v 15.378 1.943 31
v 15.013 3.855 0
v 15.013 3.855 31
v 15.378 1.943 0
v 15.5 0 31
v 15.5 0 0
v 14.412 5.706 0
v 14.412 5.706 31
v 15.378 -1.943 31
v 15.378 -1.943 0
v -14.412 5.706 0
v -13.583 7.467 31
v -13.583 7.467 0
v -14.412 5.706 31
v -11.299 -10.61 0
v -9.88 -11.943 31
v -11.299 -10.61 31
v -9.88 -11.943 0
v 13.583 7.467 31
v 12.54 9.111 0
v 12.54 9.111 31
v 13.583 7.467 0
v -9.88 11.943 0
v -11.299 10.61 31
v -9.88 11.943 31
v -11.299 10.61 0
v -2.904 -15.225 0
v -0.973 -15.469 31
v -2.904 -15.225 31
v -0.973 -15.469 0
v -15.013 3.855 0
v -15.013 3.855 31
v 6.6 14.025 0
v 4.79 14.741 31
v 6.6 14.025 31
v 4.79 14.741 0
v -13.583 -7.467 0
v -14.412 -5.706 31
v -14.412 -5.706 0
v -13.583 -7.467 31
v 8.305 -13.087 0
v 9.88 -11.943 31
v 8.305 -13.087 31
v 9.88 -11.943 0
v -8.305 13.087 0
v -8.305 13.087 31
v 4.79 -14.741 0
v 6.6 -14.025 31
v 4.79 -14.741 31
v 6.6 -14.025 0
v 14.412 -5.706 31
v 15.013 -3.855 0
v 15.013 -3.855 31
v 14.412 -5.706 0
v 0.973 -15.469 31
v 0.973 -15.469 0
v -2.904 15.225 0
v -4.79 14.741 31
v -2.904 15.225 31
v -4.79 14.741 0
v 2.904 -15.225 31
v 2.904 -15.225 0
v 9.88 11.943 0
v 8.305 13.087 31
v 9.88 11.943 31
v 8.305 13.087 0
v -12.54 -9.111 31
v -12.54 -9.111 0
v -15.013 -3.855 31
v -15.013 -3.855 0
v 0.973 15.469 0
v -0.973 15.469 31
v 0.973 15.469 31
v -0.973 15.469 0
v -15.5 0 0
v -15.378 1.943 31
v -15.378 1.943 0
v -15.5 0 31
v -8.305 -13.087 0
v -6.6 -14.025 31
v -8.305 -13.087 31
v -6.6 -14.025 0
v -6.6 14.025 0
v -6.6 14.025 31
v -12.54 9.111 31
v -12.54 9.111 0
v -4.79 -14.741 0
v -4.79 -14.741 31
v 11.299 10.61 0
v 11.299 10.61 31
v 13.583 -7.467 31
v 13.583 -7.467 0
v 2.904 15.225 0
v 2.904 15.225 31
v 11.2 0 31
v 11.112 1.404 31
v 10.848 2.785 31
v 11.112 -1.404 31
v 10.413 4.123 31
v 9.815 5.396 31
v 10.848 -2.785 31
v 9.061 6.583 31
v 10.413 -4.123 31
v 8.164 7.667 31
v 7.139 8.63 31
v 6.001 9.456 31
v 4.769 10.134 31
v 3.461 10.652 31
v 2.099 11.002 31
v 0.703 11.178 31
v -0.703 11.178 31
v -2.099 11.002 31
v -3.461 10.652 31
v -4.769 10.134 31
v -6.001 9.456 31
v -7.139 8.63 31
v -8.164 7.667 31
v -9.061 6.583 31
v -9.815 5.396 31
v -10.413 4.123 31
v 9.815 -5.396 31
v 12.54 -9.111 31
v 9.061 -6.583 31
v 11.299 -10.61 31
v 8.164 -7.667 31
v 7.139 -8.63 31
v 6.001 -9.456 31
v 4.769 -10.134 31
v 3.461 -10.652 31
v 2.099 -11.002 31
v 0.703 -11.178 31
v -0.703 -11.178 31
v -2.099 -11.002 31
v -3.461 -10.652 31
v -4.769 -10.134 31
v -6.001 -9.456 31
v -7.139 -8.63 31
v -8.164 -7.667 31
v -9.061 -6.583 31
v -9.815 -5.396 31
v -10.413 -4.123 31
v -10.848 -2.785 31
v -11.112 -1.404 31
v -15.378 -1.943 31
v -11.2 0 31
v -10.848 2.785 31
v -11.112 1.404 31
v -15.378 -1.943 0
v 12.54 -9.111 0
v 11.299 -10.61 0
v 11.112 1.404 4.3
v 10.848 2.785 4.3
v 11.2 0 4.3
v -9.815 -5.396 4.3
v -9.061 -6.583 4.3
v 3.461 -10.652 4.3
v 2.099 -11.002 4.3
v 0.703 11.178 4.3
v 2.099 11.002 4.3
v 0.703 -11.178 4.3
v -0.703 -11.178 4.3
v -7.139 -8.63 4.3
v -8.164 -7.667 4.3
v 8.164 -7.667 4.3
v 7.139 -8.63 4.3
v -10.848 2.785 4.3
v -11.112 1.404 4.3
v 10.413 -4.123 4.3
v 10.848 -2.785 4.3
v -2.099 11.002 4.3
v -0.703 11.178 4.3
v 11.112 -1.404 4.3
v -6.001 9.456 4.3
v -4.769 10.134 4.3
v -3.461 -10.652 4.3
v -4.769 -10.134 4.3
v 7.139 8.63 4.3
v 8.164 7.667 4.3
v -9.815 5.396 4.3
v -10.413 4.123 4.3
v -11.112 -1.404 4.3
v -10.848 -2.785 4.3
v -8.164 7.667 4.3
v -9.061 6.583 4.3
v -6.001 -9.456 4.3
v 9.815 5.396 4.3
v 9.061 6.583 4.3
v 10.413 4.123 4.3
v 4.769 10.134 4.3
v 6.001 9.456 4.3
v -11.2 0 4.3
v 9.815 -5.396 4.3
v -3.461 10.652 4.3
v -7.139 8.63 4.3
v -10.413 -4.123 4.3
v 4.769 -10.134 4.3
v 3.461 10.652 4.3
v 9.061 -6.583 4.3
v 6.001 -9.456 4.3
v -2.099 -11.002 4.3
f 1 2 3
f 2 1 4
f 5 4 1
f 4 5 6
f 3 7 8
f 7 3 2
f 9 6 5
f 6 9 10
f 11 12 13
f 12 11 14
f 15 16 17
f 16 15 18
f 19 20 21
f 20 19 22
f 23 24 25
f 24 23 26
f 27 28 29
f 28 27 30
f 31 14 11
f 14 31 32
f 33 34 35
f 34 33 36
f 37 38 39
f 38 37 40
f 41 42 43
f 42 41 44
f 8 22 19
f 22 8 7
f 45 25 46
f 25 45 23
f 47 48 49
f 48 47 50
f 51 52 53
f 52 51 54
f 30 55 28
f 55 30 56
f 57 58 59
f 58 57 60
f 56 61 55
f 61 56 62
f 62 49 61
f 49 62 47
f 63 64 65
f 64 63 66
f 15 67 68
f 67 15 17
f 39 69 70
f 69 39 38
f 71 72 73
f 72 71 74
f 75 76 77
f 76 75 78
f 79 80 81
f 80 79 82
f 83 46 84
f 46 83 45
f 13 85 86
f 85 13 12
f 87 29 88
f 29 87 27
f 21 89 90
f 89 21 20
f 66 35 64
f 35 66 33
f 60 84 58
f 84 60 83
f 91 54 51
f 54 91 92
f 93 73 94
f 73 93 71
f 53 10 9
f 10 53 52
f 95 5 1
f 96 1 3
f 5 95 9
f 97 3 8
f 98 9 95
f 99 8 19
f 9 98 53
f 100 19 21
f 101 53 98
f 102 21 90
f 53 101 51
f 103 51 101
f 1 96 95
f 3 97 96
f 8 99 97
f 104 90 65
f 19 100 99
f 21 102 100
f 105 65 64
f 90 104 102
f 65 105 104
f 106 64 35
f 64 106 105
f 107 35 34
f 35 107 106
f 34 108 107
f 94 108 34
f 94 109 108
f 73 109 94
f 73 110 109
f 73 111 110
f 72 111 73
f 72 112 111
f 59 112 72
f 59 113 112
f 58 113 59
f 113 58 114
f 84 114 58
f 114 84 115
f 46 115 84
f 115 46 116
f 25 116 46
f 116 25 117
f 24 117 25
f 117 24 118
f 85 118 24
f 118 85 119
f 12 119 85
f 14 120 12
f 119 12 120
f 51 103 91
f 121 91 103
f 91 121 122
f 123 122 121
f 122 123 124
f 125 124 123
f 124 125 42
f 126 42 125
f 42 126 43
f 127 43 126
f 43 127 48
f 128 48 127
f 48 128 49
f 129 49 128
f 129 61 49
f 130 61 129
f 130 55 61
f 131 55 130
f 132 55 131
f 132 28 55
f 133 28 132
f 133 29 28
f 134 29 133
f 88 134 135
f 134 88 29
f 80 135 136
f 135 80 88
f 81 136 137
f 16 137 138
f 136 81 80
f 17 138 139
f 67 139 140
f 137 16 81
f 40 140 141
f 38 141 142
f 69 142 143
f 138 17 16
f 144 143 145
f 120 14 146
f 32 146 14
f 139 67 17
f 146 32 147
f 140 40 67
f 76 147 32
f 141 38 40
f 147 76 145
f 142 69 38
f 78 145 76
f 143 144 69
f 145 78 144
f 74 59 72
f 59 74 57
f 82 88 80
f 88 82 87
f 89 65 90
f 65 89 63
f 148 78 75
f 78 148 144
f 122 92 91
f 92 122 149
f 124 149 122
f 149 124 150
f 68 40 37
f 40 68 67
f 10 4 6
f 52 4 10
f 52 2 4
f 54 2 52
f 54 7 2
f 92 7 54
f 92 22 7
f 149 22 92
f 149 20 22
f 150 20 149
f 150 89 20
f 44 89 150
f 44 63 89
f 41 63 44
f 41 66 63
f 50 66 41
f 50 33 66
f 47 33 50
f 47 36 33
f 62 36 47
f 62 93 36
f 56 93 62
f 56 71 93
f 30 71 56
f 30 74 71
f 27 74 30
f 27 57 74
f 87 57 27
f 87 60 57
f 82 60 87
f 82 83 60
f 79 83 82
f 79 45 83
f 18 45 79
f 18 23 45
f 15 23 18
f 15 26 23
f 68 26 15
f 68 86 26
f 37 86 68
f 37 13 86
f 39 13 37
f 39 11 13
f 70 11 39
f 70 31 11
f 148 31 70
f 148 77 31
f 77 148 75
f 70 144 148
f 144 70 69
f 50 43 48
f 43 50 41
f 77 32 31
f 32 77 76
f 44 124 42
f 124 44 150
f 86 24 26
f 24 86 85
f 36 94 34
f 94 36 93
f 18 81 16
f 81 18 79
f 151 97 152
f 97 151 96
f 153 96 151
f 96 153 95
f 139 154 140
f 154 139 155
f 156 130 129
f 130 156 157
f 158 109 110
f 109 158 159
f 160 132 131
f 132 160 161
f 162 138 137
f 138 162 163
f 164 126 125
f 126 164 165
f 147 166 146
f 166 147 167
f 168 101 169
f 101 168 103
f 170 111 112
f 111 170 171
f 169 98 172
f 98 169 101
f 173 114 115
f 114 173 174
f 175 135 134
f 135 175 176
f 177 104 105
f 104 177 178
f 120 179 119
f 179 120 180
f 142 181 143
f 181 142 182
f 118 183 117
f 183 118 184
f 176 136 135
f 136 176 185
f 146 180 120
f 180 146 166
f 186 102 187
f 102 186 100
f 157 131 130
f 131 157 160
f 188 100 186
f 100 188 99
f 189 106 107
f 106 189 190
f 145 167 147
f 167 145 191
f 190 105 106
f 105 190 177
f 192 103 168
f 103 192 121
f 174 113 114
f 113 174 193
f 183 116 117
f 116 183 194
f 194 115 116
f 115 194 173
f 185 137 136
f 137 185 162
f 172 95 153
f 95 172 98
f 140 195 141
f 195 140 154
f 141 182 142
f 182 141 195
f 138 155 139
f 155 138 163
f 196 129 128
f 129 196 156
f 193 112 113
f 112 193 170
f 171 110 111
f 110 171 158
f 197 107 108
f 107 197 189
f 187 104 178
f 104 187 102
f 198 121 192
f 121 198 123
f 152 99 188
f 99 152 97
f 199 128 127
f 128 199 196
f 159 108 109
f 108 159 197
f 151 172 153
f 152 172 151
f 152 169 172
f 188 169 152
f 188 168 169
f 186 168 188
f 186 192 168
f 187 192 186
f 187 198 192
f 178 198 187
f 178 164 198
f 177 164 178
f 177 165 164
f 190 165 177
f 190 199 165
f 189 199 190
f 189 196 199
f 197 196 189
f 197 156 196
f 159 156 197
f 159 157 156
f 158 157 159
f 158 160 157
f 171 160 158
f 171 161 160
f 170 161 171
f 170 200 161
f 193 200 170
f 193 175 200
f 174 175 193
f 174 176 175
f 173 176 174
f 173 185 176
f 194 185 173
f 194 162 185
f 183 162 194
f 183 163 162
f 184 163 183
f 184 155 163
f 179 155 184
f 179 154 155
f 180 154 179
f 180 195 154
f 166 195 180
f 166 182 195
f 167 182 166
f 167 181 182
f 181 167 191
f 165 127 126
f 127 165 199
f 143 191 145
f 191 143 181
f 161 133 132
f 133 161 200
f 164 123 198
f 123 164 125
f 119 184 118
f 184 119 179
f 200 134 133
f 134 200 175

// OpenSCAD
difference()
{
    cylinder(d=31,h=31,$fn=50);
    translate([0,0,(31-22.4)/2])
    cylinder(d=22.4,h=31,$fn=50);
};
